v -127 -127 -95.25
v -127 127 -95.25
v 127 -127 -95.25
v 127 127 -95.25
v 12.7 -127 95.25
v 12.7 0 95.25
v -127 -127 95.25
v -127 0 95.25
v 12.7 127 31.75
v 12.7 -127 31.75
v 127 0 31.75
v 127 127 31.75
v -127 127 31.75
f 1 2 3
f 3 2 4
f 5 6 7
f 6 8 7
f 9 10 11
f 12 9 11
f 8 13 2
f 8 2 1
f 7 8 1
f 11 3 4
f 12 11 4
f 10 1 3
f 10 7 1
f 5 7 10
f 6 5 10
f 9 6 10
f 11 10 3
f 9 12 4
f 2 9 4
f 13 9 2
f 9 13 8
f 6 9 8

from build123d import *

# Parameters (mm, degrees)
F2_DEPTH  = 127
F3_DEPTH  = 12.7
F0_W      = 139.7
F0_H      = 127
F4_DEPTH  = 31.75
F5_DEPTH  = 95.25
F6_DEPTH  = 31.75
F7_DEPTH  = 95.25
F8_DEPTH  = 31.75
F9_DEPTH  = 95.25
F13_DEPTH = 185.674


with BuildPart() as f2:
    # F1 (on Right) → F2 (new body)
    with BuildSketch(Plane.YZ):
        Polygon((0, 31.75), (127, 31.75), (0, 95.25), (-127, 95.25), (-127, 31.75), align=None)
    extrude(amount=-F2_DEPTH)

    # F1 (on Right) → F3 (join)
    with BuildSketch(Plane.YZ):
        Polygon((0, 31.75), (127, 31.75), (0, 95.25), (-127, 95.25), (-127, 31.75), align=None)
    extrude(amount=F3_DEPTH)

    # F0 (on Top) → F4 (join)
    with BuildSketch(Plane.XY):
        with Locations((-57.15, -63.5)):
            Rectangle(F0_W, F0_H)
        with Locations((-57.15, 63.5)):
            Rectangle(F0_W, F0_H)
    extrude(amount=F4_DEPTH)

    # F0 (on Top) → F5 (join)
    with BuildSketch(Plane.XY):
        with Locations((-57.15, -63.5)):
            Rectangle(F0_W, F0_H)
        with Locations((-57.15, 63.5)):
            Rectangle(F0_W, F0_H)
    extrude(amount=-F5_DEPTH)

    # F0 (on Top) → F6 (join)
    with BuildSketch(Plane.XY):
        Polygon((12.7, 0), (12.7, -127), (127, 0), (127, 127), (12.7, 127), align=None)
    extrude(amount=F6_DEPTH)

    # F0 (on Top) → F7 (join)
    with BuildSketch(Plane.XY):
        Polygon((12.7, 0), (12.7, -127), (127, 0), (127, 127), (12.7, 127), align=None)
    extrude(amount=-F7_DEPTH)

    # F0 (on Top) → F8 (join)
    with BuildSketch(Plane.XY):
        with Locations((-57.15, -63.5)):
            Rectangle(F0_W, F0_H)
        Polygon((127, 0), (12.7, -127), (127, -127), align=None)
        Polygon((12.7, 0), (12.7, -127), (127, 0), (127, 127), (12.7, 127), align=None)
        with Locations((-57.15, 63.5)):
            Rectangle(F0_W, F0_H)
    extrude(amount=F8_DEPTH)

    # F0 (on Top) → F9 (join)
    with BuildSketch(Plane.XY):
        Polygon((127, 0), (12.7, -127), (127, -127), align=None)
    extrude(amount=-F9_DEPTH)

    # F12 (on 3pt) → F13 (cut)
    with BuildSketch(Plane(origin=(59.3797709924, -53.4417938931, 53.4417938931), x_dir=(0.4132877914, 0.8311676694, 0.3719590123), z_dir=(0.6178020632, -0.5560218569, 0.5560218569))):
        Polygon((-88.4998404232, -155.7572883461), (64.2972481493, -61.3589317727), (-88.4998404232, 15.1037370517), align=None)
    extrude(amount=F13_DEPTH, mode=Mode.SUBTRACT)


solid = f2.part
